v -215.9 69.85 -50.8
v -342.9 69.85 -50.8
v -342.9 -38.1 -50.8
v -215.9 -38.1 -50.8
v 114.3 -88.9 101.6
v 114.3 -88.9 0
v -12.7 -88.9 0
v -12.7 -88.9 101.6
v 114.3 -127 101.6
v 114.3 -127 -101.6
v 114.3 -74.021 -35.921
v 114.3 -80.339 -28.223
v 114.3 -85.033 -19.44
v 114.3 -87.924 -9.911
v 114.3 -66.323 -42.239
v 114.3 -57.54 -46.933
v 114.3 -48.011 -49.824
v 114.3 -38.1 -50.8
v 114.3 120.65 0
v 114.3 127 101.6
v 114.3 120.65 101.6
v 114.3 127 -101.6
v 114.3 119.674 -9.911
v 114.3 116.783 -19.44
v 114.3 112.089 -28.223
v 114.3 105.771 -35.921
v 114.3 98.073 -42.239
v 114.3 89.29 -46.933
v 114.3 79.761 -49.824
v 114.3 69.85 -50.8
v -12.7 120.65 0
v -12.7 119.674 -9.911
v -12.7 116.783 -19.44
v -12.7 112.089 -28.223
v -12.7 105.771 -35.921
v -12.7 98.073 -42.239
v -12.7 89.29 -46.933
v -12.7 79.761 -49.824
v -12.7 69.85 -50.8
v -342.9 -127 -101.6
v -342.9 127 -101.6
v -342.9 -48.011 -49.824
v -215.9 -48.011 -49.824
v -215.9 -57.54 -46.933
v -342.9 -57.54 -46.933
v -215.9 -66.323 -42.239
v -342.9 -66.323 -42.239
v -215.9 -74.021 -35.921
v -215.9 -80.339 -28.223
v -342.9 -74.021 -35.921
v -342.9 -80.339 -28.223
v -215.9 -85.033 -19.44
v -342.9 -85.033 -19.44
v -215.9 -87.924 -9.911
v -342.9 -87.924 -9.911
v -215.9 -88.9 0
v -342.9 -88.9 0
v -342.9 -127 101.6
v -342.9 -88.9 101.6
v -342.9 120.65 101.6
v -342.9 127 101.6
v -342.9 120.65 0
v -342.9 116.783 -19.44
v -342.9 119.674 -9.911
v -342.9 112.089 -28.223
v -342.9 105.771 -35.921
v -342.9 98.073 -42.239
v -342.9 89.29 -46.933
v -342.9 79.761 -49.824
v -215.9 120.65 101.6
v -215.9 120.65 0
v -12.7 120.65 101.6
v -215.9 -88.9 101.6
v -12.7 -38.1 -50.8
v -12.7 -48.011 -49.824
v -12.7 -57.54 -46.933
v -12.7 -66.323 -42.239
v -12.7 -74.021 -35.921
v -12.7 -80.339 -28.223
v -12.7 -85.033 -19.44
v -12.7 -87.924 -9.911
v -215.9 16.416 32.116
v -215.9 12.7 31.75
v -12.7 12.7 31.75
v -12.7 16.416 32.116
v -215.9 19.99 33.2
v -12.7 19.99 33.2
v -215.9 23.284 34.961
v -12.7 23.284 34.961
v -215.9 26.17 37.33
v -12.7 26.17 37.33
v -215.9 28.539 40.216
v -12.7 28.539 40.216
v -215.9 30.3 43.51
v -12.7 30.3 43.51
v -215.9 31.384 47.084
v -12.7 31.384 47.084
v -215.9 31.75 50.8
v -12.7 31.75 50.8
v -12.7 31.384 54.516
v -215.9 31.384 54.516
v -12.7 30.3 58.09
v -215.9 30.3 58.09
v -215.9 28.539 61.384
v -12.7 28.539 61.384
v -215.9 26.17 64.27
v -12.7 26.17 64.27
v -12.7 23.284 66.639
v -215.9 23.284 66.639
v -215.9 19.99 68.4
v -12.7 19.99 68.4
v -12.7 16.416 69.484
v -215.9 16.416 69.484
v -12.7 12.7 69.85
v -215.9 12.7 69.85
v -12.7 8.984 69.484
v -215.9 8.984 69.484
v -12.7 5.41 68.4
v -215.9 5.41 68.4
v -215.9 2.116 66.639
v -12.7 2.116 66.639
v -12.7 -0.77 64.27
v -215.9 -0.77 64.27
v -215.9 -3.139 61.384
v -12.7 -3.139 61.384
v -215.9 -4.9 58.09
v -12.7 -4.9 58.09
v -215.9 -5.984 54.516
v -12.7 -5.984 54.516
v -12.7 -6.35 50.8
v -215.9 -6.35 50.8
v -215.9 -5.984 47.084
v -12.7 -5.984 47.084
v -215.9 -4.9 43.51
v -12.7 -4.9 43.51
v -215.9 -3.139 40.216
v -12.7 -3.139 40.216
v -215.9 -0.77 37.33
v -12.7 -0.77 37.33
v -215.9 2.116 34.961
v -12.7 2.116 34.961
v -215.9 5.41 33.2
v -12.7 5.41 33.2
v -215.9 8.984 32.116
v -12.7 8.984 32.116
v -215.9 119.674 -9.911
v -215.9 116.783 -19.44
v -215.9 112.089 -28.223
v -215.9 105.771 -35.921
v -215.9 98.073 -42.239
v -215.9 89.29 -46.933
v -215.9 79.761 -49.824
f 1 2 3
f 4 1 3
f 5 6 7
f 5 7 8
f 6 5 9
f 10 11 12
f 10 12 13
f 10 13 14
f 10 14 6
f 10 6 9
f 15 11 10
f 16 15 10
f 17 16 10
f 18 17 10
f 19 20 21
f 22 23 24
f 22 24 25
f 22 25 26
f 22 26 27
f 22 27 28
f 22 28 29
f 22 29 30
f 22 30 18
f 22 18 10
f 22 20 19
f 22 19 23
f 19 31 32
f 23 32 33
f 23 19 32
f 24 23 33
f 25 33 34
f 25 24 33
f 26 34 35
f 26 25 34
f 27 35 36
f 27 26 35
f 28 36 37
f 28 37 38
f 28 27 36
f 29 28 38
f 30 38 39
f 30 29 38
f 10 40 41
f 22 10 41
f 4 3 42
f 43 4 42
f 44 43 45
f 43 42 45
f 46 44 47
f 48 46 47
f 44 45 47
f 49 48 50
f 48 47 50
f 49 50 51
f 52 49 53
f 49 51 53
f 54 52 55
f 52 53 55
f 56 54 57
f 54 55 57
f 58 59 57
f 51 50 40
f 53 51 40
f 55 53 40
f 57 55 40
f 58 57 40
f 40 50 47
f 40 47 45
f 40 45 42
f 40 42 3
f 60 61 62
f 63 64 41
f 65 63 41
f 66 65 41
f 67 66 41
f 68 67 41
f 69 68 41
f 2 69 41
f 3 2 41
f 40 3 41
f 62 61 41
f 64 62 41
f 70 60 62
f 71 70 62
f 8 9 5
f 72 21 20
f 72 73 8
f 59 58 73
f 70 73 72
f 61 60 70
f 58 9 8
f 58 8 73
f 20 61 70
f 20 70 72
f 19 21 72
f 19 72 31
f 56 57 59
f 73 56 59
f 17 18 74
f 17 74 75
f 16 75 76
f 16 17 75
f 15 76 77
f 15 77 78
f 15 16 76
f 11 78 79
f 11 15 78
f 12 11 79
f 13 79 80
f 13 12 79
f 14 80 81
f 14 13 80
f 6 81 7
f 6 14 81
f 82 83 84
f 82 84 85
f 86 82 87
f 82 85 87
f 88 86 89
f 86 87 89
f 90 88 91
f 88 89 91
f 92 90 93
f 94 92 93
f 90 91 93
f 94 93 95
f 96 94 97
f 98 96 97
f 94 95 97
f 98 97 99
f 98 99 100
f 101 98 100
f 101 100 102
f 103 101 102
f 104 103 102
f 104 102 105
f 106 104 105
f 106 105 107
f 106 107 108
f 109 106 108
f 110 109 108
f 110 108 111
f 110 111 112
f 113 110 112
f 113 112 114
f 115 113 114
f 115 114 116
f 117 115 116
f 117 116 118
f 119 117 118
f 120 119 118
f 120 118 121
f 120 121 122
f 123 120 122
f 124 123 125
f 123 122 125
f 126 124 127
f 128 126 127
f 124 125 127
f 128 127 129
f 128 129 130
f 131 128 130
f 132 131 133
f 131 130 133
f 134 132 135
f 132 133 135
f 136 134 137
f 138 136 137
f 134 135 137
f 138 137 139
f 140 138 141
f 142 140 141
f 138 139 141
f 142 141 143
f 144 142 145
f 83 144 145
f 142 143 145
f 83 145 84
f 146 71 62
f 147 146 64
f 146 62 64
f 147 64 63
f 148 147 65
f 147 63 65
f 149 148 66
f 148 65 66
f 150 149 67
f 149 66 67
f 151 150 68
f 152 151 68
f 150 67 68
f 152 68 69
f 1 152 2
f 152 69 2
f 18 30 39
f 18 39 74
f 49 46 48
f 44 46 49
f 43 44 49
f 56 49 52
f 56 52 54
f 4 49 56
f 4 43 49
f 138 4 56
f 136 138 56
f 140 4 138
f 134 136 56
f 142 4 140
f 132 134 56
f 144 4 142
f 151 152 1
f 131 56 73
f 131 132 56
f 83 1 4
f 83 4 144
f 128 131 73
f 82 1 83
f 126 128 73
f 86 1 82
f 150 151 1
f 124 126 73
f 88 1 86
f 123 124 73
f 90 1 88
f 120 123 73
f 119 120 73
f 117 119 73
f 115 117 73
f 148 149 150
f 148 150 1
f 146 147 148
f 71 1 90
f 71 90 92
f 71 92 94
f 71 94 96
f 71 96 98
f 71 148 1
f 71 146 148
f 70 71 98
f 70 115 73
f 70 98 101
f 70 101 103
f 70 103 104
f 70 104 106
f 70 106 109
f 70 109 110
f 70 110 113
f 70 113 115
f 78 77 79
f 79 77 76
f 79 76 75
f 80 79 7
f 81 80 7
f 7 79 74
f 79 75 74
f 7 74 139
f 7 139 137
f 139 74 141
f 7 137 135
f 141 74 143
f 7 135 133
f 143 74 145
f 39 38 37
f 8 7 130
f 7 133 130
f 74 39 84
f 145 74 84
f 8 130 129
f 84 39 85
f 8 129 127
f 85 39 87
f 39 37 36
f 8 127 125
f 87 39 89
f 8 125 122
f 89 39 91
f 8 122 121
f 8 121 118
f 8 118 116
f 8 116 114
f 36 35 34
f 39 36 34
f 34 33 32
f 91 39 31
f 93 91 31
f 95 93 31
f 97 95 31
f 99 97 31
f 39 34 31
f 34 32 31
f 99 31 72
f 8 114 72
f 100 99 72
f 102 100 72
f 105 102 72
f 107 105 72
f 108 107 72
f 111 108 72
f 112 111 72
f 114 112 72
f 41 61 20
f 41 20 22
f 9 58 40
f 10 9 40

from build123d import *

# Parameters (mm, degrees)
SKETCH1_W           = 203.2
SKETCH1_H           = 254
BOSS_EXTRUDE1_DEPTH = 114.3
CUT_EXTRUDE2_DEPTH  = 127
SKETCH3_R           = 19.05
CUT_EXTRUDE3_DEPTH  = 380.515441056


with BuildPart() as part:
    # Sketch1 → Boss-Extrude1 (new, symmetric)
    with BuildSketch(Plane(origin=(0, 0, 0), x_dir=(0, 0, -1), z_dir=(1, 0, 0))):
        Rectangle(SKETCH1_W, SKETCH1_H)
    extrude(amount=BOSS_EXTRUDE1_DEPTH, both=True)

    # Sketch2 → Cut-Extrude2 (cut)
    with BuildSketch(Plane(origin=(114.3, 0, 0), x_dir=(0, 0, -1), z_dir=(1, 0, 0))):
        with BuildLine():
            Line((-101.6, 120.65), (0, 120.65))
            ThreePointArc((0, 120.65), (35.921024484, 105.771024484), (50.8, 69.85))
            Line((50.8, 69.85), (50.8, -38.1))
            ThreePointArc((50.8, -38.1), (35.921024484, -74.021024484), (0, -88.9))
            Line((0, -88.9), (-101.6, -88.9))
            Line((-101.6, -88.9), (-101.6, 120.65))
        make_face()
    extrude(amount=-CUT_EXTRUDE2_DEPTH, mode=Mode.SUBTRACT)

    # Mirror1: part across plane


with BuildPart() as part_1:
    add(part.part)
    add(part.part.mirror(Plane(origin=(-114.3, 0, 0), x_dir=(0, 0, 1), z_dir=(1, 0, 0))))

    # Sketch3 → Cut-Extrude3 (cut, through all)
    with BuildSketch(Plane(origin=(0, 0, 0), x_dir=(0, 0, -1), z_dir=(1, 0, 0))):
        with Locations((-50.8, 12.7)):
            Circle(SKETCH3_R)
    extrude(amount=-CUT_EXTRUDE3_DEPTH, mode=Mode.SUBTRACT)


solid = part_1.part
